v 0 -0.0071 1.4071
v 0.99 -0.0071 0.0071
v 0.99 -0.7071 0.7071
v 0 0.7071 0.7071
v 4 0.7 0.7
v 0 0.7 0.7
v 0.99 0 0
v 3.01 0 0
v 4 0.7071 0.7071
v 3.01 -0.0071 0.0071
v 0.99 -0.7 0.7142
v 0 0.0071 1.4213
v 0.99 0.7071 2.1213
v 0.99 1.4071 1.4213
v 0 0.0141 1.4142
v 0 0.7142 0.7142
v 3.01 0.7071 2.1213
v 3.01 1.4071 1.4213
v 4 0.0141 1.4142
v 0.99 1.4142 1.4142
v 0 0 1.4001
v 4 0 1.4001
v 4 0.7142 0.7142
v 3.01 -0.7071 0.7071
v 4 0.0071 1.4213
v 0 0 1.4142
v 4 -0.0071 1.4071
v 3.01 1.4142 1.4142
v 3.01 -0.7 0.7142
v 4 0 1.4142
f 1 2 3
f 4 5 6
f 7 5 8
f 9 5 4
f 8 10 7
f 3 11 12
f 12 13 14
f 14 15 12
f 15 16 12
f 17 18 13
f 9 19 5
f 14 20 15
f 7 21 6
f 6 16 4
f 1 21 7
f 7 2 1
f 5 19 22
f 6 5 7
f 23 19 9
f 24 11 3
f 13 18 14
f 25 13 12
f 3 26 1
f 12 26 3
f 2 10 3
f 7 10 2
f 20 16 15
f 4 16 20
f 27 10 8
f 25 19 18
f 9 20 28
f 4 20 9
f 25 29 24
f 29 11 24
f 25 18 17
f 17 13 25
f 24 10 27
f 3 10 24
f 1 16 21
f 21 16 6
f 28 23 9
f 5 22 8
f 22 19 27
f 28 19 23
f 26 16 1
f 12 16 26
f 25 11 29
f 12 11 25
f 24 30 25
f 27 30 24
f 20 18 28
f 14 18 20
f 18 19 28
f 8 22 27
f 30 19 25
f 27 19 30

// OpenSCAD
$fn=5;
hull()
{
	hull()
	{
		translate([0.99,0.7000357,0.70003575])
		{
			rotate(45.000004,[1,0,0])
			{
				cube([0.01,0.01,0.01]);
			}
		}
		translate([0.99,-0.000000059604645,1.4000714])
		{
			rotate(45.000004,[1,0,0])
			{
				cube([0.01,0.01,0.01]);
			}
		}
	}
	hull()
	{
		translate([0.99,0,0])
		{
			rotate(45.000004,[1,0,0])
			{
				cube([0.01,0.01,0.01]);
			}
		}
		translate([0.99,-0.70003575,0.7000357])
		{
			rotate(45.000004,[1,0,0])
			{
				cube([0.01,0.01,0.01]);
			}
		}
	}
	hull()
	{
		translate([0,0.7000357,0.70003575])
		{
			rotate(45.000004,[1,0,0])
			{
				cube([0.01,0.01,0.01]);
			}
		}
		translate([0,-0.000000059604645,1.4000714])
		{
			rotate(45.000004,[1,0,0])
			{
				cube([0.01,0.01,0.01]);
			}
		}
	}
	hull()
	{
		translate([3,0.7000357,0.70003575])
		{
			rotate(45.000004,[1,0,0])
			{
				cube([0.01,0.01,0.01]);
			}
		}
		translate([3,-0.000000059604645,1.4000714])
		{
			rotate(45.000004,[1,0,0])
			{
				cube([0.01,0.01,0.01]);
			}
		}
	}
	hull()
	{
		translate([3,0,0])
		{
			rotate(45.000004,[1,0,0])
			{
				cube([0.01,0.01,0.01]);
			}
		}
		translate([3,-0.70003575,0.7000357])
		{
			rotate(45.000004,[1,0,0])
			{
				cube([0.01,0.01,0.01]);
			}
		}
	}
	hull()
	{
		translate([3.99,0.7000357,0.70003575])
		{
			rotate(45.000004,[1,0,0])
			{
				cube([0.01,0.01,0.01]);
			}
		}
		translate([3.99,-0.000000059604645,1.4000714])
		{
			rotate(45.000004,[1,0,0])
			{
				cube([0.01,0.01,0.01]);
			}
		}
	}
	hull()
	{
		translate([0.99,0.7071067,0.7071068])
		{
			rotate(45.000004,[1,0,0])
			{
				cube([0.01,0.01,0.01]);
			}
		}
		translate([0.99,0.0070709586,1.4071425])
		{
			rotate(45.000004,[1,0,0])
			{
				cube([0.01,0.01,0.01]);
			}
		}
	}
	hull()
	{
		translate([0,0.7071067,0.7071068])
		{
			rotate(45.000004,[1,0,0])
			{
				cube([0.01,0.01,0.01]);
			}
		}
		translate([0,0.0070709586,1.4071425])
		{
			rotate(45.000004,[1,0,0])
			{
				cube([0.01,0.01,0.01]);
			}
		}
	}
	hull()
	{
		translate([0.99,1.4071424,1.4071426])
		{
			rotate(45.000004,[1,0,0])
			{
				cube([0.01,0.01,0.01]);
			}
		}
		translate([0.99,0.70710665,2.1071782])
		{
			rotate(45.000004,[1,0,0])
			{
				cube([0.01,0.01,0.01]);
			}
		}
	}
	hull()
	{
		translate([3,0.7071067,0.7071068])
		{
			rotate(45.000004,[1,0,0])
			{
				cube([0.01,0.01,0.01]);
			}
		}
		translate([3,0.0070709586,1.4071425])
		{
			rotate(45.000004,[1,0,0])
			{
				cube([0.01,0.01,0.01]);
			}
		}
	}
	hull()
	{
		translate([3.99,0.7071067,0.7071068])
		{
			rotate(45.000004,[1,0,0])
			{
				cube([0.01,0.01,0.01]);
			}
		}
		translate([3.99,0.0070709586,1.4071425])
		{
			rotate(45.000004,[1,0,0])
			{
				cube([0.01,0.01,0.01]);
			}
		}
	}
	hull()
	{
		translate([3,1.4071424,1.4071426])
		{
			rotate(45.000004,[1,0,0])
			{
				cube([0.01,0.01,0.01]);
			}
		}
		translate([3,0.70710665,2.1071782])
		{
			rotate(45.000004,[1,0,0])
			{
				cube([0.01,0.01,0.01]);
			}
		}
	}
}
